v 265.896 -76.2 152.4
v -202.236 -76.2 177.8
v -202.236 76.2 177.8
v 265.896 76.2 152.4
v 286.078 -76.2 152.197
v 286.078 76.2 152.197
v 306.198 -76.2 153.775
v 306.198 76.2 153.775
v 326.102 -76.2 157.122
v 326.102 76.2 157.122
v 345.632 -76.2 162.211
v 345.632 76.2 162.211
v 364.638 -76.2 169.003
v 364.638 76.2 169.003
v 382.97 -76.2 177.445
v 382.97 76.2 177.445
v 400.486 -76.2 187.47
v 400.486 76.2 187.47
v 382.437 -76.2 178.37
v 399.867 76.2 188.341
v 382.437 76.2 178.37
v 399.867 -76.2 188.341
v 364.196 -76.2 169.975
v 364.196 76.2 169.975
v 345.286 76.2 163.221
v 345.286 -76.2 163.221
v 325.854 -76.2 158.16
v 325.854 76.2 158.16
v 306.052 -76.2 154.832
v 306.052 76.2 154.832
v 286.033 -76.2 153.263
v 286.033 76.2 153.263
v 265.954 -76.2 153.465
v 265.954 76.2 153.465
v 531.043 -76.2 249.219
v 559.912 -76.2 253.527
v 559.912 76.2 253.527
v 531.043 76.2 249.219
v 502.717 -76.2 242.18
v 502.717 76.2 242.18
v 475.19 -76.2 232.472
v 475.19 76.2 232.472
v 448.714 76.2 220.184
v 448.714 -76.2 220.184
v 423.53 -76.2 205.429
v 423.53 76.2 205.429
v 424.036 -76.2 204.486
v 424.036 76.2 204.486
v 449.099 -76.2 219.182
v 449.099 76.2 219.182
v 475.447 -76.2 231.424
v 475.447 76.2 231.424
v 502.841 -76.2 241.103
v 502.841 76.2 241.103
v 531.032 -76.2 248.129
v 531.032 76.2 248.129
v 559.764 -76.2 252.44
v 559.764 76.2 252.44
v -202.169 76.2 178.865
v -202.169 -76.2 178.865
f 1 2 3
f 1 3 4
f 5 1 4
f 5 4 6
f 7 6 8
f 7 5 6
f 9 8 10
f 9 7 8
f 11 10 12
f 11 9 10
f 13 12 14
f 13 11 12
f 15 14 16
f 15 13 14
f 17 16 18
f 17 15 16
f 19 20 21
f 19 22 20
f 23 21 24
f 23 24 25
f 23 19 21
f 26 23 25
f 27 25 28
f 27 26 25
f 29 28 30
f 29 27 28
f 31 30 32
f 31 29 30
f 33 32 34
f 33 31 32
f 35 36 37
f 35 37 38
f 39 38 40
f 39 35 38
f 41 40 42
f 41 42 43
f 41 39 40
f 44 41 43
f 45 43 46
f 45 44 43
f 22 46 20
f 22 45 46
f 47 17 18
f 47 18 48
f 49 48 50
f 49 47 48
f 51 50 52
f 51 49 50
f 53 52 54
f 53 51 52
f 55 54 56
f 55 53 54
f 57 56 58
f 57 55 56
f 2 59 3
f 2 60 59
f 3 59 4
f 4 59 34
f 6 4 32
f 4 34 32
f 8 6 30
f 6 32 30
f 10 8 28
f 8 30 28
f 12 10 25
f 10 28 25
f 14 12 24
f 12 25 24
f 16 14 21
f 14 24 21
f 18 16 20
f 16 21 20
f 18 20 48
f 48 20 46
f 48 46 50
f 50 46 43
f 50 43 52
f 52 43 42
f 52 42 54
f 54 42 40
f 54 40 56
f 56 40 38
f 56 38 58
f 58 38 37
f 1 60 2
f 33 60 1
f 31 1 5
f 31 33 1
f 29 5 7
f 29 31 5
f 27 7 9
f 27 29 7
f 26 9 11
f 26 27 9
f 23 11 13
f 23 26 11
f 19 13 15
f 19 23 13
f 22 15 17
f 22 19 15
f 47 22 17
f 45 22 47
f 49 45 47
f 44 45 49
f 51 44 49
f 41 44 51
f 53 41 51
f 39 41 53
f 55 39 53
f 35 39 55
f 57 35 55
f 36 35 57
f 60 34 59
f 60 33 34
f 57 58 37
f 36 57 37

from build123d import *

# Parameters (mm, degrees)
F1_DEPTH      = 76.2
F1_DEPTH_BACK = 76.2


with BuildPart() as f1:
    # F0 (on Front) → F1 (new body, two sides)
    with BuildSketch(Plane.XZ) as f1_sk:
        with BuildLine():
            Line((-202.168562, 178.864715), (-202.235902, 177.8))
            Line((-202.235902, 177.8), (265.896064, 152.4))
            ThreePointArc((265.896064, 152.4), (335.923144, 159.450833), (400.48638, 187.470376))
            ThreePointArc((400.48638, 187.470376), (475.446875, 231.42442), (559.764098, 252.439644))
            Line((559.764098, 252.439644), (559.912065, 253.526855))
            ThreePointArc((559.912065, 253.526855), (475.190079, 232.471765), (399.866841, 188.340805))
            ThreePointArc((399.866841, 188.340805), (335.625955, 160.475818), (265.953862, 153.465233))
            Line((265.953862, 153.465233), (-202.168562, 178.864715))
        make_face()
    extrude(amount=F1_DEPTH)
    extrude(f1_sk.sketch, amount=-F1_DEPTH_BACK)


solid = f1.part
